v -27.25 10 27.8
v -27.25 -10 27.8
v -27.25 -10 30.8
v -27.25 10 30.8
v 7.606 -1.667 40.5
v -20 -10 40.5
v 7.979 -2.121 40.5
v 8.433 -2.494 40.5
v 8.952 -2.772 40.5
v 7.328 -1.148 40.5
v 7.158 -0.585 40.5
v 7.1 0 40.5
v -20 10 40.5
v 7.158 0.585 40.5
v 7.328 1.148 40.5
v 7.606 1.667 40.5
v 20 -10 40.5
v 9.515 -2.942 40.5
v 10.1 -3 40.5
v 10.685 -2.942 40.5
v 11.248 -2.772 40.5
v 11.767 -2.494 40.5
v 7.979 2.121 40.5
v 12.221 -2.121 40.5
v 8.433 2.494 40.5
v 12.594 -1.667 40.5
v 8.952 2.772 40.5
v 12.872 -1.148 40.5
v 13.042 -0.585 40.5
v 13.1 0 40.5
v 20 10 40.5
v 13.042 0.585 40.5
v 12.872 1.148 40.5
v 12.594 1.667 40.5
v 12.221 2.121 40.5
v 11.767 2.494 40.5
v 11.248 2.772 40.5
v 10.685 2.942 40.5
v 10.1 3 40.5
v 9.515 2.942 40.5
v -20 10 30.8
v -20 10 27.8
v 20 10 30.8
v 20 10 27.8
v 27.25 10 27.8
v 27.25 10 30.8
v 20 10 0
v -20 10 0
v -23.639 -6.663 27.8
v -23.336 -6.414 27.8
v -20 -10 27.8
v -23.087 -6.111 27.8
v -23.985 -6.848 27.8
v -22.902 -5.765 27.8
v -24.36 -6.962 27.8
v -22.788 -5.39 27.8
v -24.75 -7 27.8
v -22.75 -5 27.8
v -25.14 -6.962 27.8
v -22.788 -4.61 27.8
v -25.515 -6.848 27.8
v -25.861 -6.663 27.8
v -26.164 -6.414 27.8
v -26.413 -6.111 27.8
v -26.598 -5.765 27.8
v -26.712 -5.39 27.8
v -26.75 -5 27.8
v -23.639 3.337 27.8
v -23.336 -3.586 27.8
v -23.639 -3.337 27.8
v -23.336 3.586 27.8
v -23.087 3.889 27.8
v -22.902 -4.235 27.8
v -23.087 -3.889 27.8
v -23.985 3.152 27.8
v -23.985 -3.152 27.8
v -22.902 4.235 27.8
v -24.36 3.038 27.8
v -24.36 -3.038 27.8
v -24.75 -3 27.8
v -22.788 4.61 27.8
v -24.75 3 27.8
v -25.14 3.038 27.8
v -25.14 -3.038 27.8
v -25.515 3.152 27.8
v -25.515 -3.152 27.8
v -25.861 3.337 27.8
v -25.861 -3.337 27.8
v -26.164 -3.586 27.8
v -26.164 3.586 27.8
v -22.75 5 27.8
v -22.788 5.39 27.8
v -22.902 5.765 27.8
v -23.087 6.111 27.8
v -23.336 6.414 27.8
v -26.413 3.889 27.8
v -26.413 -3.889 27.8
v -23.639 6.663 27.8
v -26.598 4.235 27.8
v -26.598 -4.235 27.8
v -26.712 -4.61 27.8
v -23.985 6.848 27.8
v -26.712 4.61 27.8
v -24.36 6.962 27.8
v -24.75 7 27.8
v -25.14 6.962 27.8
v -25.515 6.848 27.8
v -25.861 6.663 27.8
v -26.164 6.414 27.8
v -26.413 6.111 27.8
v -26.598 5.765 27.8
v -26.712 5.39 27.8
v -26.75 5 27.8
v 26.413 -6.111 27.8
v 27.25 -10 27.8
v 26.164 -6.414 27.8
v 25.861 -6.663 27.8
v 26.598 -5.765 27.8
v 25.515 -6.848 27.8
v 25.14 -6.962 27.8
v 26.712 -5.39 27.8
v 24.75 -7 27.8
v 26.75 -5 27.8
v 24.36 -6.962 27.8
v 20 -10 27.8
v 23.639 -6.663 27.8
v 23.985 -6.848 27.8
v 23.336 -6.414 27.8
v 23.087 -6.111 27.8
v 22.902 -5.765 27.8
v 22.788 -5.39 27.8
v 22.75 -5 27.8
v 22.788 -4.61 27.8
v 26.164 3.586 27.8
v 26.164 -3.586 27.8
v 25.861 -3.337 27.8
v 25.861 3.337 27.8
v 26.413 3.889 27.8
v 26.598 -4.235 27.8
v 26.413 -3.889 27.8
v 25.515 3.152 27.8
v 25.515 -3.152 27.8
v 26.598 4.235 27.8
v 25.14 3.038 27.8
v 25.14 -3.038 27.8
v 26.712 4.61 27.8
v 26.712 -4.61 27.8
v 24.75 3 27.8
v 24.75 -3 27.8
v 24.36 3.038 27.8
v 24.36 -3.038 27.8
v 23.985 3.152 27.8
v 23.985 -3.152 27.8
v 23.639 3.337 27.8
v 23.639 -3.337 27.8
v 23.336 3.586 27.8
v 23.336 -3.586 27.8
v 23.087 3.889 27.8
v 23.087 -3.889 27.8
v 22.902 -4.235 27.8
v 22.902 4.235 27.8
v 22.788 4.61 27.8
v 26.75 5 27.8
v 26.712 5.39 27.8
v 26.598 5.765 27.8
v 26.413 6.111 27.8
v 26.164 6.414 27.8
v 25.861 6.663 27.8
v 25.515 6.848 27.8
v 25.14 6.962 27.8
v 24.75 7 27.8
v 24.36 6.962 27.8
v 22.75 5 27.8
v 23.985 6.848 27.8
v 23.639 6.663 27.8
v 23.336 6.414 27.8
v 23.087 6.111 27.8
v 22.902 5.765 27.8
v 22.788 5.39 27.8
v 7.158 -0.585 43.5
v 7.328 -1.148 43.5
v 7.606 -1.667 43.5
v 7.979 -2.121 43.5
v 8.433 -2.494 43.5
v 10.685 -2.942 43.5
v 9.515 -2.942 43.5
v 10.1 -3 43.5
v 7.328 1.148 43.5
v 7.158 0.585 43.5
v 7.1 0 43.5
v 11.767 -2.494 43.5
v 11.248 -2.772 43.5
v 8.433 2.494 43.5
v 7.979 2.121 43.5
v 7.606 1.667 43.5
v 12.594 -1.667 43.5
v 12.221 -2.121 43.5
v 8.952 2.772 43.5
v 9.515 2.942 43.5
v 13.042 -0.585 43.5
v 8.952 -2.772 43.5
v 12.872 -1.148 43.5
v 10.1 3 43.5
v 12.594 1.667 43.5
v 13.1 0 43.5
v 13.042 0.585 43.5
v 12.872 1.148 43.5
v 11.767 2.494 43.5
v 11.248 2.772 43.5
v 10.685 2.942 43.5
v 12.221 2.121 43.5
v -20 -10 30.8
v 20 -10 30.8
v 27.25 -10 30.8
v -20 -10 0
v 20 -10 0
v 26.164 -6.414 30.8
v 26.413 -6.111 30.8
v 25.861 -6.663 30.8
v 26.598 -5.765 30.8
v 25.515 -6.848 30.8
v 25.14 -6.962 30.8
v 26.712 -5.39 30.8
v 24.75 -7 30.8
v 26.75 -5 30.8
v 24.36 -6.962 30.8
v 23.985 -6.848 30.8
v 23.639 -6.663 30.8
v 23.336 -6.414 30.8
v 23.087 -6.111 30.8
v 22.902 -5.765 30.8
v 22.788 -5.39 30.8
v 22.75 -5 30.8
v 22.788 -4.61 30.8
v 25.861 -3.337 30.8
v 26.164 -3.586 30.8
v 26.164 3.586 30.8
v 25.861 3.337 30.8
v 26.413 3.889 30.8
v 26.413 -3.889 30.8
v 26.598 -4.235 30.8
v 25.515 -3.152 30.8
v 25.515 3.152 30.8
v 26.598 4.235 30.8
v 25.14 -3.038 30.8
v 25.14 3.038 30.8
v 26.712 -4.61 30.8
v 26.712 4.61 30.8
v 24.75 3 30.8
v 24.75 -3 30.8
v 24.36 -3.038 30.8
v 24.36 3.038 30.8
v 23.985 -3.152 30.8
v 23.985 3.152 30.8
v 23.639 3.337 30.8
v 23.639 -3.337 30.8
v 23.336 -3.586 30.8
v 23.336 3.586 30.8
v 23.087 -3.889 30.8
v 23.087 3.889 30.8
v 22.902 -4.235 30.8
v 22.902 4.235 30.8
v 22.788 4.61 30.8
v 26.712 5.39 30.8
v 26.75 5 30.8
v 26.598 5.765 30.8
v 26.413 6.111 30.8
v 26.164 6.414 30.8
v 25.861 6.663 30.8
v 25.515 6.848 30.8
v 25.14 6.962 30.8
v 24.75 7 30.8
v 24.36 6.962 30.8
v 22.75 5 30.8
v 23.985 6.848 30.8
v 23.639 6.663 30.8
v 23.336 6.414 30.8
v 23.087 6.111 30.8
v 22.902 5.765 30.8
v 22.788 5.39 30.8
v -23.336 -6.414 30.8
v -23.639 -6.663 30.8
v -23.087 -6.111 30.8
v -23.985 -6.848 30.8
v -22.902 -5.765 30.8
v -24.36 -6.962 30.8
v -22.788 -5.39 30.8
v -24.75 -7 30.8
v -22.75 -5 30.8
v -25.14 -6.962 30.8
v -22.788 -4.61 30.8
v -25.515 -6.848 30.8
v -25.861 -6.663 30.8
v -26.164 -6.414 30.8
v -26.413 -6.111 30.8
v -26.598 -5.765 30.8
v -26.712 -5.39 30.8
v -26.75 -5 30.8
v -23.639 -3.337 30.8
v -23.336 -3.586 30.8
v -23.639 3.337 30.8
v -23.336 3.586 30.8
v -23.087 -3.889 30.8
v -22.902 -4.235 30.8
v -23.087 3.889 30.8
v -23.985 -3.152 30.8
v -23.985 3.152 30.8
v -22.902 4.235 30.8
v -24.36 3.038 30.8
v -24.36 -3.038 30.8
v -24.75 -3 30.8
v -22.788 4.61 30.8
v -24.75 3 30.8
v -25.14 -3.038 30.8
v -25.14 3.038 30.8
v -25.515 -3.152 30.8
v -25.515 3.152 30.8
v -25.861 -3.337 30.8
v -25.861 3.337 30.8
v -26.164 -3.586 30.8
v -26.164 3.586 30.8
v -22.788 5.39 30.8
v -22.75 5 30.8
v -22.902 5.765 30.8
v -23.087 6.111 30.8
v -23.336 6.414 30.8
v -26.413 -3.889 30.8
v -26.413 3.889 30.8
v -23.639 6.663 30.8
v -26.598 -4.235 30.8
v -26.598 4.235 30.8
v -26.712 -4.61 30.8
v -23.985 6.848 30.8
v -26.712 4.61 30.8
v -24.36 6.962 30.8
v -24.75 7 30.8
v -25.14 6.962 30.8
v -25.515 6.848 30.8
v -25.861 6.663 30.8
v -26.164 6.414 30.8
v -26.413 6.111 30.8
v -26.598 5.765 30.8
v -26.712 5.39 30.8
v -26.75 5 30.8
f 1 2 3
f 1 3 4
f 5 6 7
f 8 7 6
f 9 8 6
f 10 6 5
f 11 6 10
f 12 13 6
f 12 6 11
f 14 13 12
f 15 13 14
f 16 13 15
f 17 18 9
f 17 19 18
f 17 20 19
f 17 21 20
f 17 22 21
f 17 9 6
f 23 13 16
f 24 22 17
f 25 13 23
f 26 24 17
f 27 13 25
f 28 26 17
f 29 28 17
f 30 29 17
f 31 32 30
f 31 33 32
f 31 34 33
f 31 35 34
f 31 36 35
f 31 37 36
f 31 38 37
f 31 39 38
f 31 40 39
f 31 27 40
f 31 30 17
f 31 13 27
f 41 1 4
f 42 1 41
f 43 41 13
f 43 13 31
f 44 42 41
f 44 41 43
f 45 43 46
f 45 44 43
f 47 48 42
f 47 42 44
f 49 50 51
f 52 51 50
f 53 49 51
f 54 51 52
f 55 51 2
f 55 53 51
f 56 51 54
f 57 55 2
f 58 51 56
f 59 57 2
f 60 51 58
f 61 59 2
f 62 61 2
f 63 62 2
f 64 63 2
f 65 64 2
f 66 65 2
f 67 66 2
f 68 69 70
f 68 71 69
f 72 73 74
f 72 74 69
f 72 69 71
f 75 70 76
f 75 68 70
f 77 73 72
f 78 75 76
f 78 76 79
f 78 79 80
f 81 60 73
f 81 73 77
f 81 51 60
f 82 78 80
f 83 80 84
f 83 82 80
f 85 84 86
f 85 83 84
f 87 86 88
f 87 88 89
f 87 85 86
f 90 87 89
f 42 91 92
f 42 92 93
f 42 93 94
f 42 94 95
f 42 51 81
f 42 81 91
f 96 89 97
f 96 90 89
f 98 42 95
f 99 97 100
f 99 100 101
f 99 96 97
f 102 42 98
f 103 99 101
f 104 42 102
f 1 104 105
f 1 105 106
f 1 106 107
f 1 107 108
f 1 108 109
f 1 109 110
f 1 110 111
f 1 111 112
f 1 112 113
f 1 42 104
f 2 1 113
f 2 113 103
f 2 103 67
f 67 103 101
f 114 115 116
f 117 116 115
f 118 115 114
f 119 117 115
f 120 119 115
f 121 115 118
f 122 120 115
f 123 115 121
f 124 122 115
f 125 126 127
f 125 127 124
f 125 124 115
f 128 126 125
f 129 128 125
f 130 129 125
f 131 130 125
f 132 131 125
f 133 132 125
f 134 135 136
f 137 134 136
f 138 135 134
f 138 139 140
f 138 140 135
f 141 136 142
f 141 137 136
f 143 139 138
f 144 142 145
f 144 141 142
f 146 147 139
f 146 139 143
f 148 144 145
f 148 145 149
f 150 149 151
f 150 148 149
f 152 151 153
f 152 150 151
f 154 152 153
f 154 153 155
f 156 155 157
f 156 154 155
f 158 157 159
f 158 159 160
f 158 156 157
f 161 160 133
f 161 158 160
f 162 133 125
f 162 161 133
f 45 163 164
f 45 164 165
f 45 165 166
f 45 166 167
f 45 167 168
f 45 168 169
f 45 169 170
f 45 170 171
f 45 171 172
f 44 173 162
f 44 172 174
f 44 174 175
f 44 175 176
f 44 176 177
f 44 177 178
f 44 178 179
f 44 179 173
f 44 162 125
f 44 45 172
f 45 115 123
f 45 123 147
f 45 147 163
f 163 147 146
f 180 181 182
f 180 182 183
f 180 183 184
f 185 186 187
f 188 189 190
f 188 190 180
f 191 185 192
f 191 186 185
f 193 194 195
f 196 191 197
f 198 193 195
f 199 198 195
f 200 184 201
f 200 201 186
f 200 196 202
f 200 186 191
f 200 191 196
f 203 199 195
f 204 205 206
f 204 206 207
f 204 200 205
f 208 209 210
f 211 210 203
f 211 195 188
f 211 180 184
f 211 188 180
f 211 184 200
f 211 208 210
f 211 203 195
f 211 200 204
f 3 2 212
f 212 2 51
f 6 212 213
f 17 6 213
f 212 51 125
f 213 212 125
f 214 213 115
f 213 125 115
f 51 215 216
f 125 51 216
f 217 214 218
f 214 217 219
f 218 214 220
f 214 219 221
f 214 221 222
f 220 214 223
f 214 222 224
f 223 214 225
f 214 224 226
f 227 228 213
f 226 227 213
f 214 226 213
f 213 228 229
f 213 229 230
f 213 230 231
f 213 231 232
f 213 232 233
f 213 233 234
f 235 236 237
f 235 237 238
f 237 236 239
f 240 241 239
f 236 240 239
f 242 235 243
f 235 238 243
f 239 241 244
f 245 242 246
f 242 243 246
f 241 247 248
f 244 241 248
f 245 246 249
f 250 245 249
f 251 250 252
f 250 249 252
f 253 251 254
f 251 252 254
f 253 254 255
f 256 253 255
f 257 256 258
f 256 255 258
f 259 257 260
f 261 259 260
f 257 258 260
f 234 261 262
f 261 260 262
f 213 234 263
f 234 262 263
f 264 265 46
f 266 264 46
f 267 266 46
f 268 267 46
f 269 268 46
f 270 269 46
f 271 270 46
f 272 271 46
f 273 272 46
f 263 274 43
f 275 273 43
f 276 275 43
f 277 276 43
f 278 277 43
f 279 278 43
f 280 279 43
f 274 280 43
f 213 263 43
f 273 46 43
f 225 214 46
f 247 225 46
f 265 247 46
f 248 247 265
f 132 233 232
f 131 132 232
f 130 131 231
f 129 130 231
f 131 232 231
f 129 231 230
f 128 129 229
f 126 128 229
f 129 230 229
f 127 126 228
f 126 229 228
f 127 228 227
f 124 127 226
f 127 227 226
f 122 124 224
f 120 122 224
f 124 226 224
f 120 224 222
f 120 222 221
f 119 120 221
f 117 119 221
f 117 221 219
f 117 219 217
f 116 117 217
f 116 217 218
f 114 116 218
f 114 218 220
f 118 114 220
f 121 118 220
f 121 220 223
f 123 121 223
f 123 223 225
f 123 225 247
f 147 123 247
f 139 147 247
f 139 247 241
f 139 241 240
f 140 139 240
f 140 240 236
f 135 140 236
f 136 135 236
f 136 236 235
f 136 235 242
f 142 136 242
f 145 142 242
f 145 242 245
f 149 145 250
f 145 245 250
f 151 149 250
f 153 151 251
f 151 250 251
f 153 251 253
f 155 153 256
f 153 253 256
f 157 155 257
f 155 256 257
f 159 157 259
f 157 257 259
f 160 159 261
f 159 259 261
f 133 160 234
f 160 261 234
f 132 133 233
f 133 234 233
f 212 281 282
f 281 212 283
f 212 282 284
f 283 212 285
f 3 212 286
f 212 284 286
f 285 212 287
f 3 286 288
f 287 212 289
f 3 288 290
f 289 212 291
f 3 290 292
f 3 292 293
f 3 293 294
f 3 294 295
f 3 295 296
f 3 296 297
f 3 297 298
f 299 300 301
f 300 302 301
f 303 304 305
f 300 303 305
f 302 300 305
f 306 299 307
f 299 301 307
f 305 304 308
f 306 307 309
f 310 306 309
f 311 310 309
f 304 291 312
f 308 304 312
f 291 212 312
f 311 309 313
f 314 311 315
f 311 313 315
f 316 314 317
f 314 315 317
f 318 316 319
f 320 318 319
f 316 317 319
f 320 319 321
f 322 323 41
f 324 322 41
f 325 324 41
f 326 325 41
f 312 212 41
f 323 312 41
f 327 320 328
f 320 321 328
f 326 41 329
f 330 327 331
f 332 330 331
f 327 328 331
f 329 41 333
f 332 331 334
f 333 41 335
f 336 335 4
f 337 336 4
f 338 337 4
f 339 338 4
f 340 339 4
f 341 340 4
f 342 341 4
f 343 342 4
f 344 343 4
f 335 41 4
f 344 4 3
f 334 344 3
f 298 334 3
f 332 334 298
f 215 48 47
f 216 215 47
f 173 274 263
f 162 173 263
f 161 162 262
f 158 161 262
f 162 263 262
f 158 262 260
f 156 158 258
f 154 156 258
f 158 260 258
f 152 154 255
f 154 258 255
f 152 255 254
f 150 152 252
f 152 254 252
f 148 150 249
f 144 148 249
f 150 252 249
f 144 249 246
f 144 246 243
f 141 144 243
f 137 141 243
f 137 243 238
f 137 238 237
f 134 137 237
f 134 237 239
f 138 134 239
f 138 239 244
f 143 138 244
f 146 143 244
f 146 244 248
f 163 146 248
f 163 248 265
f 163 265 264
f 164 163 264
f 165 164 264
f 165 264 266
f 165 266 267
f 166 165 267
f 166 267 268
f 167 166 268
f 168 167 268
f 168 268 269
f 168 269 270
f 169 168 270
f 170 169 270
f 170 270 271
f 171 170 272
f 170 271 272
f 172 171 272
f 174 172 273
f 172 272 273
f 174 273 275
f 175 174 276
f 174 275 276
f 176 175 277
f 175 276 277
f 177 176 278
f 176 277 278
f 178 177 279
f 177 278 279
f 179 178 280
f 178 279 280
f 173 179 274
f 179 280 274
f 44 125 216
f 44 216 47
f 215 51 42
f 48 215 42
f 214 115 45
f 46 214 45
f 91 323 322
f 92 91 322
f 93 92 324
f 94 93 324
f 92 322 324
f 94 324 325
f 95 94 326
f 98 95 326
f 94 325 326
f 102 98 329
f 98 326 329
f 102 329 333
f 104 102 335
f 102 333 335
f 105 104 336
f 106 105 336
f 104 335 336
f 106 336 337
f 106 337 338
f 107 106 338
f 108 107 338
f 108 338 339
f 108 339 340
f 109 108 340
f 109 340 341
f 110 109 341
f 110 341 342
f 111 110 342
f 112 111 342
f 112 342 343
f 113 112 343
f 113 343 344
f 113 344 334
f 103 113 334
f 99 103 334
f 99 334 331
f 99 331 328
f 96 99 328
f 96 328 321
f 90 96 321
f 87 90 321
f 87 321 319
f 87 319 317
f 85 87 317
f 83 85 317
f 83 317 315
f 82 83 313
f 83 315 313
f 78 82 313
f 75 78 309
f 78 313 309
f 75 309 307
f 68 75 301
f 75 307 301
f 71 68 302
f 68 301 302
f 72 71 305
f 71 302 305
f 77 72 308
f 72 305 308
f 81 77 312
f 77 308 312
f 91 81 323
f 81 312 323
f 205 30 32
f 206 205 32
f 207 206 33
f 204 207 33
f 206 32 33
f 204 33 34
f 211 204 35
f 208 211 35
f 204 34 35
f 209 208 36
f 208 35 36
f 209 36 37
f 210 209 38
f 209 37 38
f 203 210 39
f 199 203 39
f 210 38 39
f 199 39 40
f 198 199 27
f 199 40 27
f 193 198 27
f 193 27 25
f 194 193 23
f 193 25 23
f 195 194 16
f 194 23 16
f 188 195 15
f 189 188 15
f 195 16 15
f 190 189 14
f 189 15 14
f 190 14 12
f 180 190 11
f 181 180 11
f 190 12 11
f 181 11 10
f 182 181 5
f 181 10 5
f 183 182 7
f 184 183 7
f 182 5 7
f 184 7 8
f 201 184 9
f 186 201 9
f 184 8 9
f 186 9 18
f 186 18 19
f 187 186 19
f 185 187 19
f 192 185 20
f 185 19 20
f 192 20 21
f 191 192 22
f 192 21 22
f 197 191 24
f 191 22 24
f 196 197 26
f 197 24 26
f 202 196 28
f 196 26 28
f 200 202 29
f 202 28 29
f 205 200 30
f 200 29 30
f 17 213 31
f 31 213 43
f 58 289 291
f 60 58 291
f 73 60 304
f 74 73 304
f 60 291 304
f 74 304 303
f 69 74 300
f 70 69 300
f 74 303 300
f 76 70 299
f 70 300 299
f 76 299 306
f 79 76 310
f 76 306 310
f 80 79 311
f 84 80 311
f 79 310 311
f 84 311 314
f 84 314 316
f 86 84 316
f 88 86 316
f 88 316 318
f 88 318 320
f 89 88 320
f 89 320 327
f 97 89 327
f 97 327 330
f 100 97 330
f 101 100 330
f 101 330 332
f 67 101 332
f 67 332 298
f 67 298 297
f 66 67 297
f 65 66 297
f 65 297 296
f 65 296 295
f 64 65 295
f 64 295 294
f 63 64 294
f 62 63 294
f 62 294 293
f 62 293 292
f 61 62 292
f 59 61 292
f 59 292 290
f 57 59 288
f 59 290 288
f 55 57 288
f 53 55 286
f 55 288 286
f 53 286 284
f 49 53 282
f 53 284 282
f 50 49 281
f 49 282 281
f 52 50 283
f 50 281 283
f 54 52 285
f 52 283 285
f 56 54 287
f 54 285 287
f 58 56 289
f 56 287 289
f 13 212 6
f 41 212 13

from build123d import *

# Parameters (mm, degrees)
SKETCH_1_W          = 40
SKETCH_1_H          = 20
EXTRUDE_1_DEPTH     = 40.5
SKETCH_2_W          = 7.25
SKETCH_2_H          = 20
EXTRUDE_2_DEPTH     = 3
SKETCH_3_R          = 2
CUT_EXTRUDE_1_DEPTH = 5
SKETCH_4_R          = 3
EXTRUDE_3_DEPTH     = 3


with BuildPart() as part:
    # 草图1 → 凸台-拉伸1 (new body)
    with BuildSketch(Plane.XY):
        Rectangle(SKETCH_1_W, SKETCH_1_H)
    extrude(amount=EXTRUDE_1_DEPTH)

    # 草图2 → 凸台-拉伸2 (add)
    with BuildSketch(Plane(origin=(0, 0, 27.8), x_dir=(-1, 0, 0), z_dir=(0, 0, -1))):
        with Locations((-23.625, 0)):
            Rectangle(SKETCH_2_W, SKETCH_2_H)
        with Locations((23.625, 0)):
            Rectangle(SKETCH_2_W, SKETCH_2_H)
    extrude(amount=-EXTRUDE_2_DEPTH)

    # 草图3 → 切除-拉伸1 (cut)
    with BuildSketch(Plane.XY.offset(30.8)):
        with Locations((-24.75, 5)):
            Circle(SKETCH_3_R)
        with Locations((-24.75, -5)):
            Circle(SKETCH_3_R)
        with Locations(Location((24.75, -5, 0), (0, 0, 180))):
            Circle(SKETCH_3_R)
        with Locations(Location((24.75, 5, 0), (0, 0, 180))):
            Circle(SKETCH_3_R)
    extrude(amount=-CUT_EXTRUDE_1_DEPTH, mode=Mode.SUBTRACT)

    # 草图4 → 凸台-拉伸3 (add)
    with BuildSketch(Plane.XY.offset(40.5)):
        with Locations((10.1, 0)):
            Circle(SKETCH_4_R)
    extrude(amount=EXTRUDE_3_DEPTH)


solid = part.part
